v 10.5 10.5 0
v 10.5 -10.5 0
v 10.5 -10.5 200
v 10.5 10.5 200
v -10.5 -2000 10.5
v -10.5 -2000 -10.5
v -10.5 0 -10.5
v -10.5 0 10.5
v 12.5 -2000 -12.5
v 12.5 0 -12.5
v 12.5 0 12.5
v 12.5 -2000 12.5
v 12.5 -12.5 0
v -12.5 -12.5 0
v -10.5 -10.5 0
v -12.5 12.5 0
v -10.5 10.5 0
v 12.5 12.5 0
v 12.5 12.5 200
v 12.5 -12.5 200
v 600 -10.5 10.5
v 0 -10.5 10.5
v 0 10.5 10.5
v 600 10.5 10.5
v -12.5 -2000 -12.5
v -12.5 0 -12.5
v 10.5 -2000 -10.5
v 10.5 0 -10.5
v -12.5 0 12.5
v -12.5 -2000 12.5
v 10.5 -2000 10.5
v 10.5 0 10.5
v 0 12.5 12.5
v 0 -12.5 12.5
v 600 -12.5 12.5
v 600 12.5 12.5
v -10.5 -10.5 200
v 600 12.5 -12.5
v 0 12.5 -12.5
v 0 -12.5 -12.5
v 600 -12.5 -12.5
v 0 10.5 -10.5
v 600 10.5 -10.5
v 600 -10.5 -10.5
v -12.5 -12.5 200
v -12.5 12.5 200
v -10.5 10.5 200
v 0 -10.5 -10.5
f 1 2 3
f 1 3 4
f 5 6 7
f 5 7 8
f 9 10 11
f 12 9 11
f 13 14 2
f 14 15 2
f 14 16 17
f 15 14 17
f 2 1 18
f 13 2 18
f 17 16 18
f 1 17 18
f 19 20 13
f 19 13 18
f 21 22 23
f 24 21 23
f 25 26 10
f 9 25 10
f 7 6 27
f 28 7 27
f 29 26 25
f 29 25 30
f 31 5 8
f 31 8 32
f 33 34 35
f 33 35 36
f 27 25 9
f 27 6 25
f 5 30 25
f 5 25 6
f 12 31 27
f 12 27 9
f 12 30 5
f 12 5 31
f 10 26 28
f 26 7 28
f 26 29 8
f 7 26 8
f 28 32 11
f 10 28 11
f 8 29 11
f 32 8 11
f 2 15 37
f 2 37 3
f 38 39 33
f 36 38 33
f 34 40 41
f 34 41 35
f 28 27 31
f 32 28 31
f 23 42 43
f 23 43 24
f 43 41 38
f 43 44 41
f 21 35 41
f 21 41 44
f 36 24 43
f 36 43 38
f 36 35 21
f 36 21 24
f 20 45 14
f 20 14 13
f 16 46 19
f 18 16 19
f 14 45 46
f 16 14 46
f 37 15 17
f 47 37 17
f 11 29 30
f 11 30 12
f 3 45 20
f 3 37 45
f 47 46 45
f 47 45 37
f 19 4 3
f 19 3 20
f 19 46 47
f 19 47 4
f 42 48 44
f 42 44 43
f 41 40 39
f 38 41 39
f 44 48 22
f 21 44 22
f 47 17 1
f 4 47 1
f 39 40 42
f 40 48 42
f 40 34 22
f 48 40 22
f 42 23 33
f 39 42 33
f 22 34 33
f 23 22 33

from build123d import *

# Parameters (mm, degrees)
F0_W     = 25
F0_H     = 25
F0_W_2   = 21
F0_H_2   = 21
F1_DEPTH = 2000
F2_W     = 25
F2_H     = 25
F2_W_2   = 21
F2_H_2   = 21
F3_DEPTH = 600
F4_W     = 25
F4_H     = 25
F4_W_2   = 21
F4_H_2   = 21
F5_DEPTH = 200


with BuildPart() as f1:
    # F0 (on Front) → F1 (new body)
    with BuildSketch(Plane.XZ):
        Rectangle(F0_W, F0_H)
        Rectangle(F0_W_2, F0_H_2, mode=Mode.SUBTRACT)
    extrude(amount=F1_DEPTH)


with BuildPart() as f3:
    # F2 (on Right) → F3 (new body)
    with BuildSketch(Plane.YZ):
        Rectangle(F2_W, F2_H)
        Rectangle(F2_W_2, F2_H_2, mode=Mode.SUBTRACT)
    extrude(amount=F3_DEPTH)


with BuildPart() as f5:
    # F4 (on Top) → F5 (new body)
    with BuildSketch(Plane.XY):
        Rectangle(F4_W, F4_H)
        Rectangle(F4_W_2, F4_H_2, mode=Mode.SUBTRACT)
    extrude(amount=F5_DEPTH)


solid = Compound([f1.part, f3.part, f5.part])
